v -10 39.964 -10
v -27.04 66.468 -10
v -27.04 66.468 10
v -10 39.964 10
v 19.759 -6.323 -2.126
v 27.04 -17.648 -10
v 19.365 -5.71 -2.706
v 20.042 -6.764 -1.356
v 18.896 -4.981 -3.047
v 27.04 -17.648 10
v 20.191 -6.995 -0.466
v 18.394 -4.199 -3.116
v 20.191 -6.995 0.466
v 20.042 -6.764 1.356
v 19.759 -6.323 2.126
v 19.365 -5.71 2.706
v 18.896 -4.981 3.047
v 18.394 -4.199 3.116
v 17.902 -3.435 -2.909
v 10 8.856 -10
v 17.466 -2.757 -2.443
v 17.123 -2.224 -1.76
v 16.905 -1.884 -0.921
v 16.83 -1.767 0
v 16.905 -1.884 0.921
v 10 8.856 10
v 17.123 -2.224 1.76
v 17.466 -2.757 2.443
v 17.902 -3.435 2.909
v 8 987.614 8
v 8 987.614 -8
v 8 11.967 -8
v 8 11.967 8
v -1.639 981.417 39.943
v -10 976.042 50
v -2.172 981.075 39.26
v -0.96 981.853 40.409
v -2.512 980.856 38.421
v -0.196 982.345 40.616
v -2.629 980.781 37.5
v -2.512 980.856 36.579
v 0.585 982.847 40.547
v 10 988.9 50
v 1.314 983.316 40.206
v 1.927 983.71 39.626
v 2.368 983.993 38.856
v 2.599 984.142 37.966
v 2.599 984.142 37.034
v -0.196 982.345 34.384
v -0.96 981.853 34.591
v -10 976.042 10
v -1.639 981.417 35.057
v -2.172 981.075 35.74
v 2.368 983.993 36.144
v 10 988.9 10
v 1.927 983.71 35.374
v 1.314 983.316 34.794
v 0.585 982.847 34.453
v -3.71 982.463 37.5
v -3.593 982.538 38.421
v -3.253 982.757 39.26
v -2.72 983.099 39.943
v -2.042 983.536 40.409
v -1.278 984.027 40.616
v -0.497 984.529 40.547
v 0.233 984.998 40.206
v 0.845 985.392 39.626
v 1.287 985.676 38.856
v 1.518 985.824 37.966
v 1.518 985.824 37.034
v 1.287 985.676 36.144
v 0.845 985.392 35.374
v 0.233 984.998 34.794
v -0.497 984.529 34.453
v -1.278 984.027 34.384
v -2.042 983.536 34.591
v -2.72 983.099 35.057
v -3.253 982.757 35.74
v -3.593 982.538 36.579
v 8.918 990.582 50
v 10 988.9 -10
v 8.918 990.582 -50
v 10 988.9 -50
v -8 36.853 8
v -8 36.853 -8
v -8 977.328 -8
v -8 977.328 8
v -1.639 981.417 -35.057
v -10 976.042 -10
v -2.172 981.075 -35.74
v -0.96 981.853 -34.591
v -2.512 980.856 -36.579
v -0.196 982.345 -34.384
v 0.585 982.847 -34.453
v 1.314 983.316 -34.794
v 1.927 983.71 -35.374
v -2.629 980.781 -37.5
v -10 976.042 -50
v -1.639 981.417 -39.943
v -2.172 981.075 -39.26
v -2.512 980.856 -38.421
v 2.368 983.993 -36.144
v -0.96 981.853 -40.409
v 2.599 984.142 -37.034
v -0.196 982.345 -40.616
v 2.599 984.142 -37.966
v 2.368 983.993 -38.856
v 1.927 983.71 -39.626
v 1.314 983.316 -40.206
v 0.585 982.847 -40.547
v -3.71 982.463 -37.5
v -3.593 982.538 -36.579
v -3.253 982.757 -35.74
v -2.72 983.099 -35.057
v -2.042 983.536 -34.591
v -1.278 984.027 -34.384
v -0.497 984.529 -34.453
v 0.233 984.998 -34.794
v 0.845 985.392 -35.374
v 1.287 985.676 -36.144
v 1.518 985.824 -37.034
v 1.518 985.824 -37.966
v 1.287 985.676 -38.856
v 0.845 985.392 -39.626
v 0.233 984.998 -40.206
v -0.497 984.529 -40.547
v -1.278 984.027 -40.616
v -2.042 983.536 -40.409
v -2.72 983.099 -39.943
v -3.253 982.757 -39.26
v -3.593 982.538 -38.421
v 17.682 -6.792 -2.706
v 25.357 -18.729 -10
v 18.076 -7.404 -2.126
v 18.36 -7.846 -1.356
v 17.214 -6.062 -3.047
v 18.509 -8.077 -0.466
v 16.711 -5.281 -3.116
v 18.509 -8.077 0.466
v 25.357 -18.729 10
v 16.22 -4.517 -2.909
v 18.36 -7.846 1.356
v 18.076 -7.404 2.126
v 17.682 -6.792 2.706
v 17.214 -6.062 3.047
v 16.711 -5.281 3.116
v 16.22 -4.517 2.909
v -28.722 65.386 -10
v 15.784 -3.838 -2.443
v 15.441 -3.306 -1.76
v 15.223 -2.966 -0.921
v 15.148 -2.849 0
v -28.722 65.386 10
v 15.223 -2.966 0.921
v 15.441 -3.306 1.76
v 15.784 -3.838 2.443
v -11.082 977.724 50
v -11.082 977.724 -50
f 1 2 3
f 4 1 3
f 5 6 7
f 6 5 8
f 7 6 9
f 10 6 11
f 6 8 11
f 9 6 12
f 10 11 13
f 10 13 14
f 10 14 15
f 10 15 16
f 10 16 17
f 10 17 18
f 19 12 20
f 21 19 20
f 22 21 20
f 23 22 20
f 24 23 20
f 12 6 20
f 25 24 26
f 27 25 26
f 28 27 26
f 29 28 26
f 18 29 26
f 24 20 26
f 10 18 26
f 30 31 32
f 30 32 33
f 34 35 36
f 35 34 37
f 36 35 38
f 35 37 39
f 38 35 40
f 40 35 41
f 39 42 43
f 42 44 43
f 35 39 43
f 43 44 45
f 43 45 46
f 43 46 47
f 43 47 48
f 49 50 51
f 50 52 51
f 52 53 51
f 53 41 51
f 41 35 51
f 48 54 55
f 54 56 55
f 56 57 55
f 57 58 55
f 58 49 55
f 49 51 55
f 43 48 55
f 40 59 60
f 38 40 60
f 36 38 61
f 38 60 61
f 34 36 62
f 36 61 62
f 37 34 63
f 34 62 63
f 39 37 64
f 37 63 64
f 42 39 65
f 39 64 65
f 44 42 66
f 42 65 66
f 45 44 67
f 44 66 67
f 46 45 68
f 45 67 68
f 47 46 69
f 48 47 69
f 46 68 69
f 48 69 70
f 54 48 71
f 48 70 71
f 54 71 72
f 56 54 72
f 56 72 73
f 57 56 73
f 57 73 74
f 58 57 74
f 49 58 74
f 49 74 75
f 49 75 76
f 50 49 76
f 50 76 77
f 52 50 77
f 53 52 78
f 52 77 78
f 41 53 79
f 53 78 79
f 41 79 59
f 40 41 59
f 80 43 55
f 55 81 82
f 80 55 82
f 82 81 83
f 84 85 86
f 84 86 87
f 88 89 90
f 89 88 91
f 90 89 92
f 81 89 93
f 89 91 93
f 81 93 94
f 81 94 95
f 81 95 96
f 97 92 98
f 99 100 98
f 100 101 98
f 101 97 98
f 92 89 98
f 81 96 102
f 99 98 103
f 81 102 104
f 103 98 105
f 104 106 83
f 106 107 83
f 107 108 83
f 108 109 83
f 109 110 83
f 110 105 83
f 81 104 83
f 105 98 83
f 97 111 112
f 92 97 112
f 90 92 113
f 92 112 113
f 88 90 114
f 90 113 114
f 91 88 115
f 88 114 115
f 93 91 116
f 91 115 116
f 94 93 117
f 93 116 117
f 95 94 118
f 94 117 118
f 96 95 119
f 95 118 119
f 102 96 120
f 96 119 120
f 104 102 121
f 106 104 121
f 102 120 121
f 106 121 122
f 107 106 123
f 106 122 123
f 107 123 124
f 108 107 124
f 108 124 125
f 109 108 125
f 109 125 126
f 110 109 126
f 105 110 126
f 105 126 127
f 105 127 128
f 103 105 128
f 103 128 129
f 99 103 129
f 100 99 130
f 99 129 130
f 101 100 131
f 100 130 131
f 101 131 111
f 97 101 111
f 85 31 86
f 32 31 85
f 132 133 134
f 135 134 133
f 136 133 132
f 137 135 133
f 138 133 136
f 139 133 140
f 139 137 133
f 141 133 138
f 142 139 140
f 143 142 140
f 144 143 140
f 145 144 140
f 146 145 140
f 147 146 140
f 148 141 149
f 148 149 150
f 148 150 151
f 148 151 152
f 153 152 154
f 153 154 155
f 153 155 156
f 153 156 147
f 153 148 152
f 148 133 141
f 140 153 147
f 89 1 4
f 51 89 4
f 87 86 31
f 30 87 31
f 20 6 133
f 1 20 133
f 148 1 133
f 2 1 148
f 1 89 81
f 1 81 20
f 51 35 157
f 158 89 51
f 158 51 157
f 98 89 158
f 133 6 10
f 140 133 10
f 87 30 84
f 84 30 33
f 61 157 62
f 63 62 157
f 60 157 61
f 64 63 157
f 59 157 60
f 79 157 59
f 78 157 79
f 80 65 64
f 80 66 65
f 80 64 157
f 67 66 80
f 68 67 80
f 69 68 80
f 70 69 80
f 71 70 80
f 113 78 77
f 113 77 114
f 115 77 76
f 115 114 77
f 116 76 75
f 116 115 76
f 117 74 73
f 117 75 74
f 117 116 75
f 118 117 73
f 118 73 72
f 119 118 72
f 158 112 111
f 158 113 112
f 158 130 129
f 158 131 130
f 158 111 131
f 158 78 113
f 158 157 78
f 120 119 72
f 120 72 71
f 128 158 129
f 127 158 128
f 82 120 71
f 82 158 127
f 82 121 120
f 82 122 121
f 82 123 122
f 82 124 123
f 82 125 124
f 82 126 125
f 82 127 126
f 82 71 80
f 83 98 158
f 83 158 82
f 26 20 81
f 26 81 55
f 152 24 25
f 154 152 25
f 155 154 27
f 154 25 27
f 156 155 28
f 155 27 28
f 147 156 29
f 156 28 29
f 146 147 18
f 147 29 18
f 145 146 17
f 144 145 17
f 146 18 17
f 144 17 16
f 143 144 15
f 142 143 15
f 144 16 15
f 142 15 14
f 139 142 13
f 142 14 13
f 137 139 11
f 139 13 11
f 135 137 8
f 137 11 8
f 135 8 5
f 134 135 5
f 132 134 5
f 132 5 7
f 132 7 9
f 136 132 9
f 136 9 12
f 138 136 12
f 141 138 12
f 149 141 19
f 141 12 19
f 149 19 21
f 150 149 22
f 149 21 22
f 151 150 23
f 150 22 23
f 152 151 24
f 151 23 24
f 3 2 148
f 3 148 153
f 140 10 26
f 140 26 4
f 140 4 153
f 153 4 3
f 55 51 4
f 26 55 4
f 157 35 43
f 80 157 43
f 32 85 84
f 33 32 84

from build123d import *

# Parameters (mm, degrees)
SKETCH15_W                                    = 20
SKETCH15_H                                    = 20
SKETCH15_W_2                                  = 16
SKETCH15_H_2                                  = 16
AL_TUBE_SQUARE_AL_TUBE_0_75_SQR_X_0_065_DEPTH = 988.9
SKETCH16_R                                    = 5
CUT_EXTRUDE1_DEPTH                            = 990.152773842
CUT_EXTRUDE3_DEPTH                            = 990.152773842
CUT_EXTRUDE4_DEPTH                            = 990.152773842
CUT_EXTRUDE4_DEPTH_BACK                       = 990.152773842
SKETCH19_W                                    = 20
SKETCH19_H                                    = 100
BOSS_EXTRUDE1_DEPTH                           = 2
SKETCH20_W                                    = 23.776793386
SKETCH20_H                                    = 100
BOSS_EXTRUDE2_DEPTH                           = 2
SKETCH22_R                                    = 3.125
CUT_EXTRUDE5_DEPTH                            = 2
SKETCH23_R                                    = 3.125
CUT_EXTRUDE6_DEPTH                            = 2


with BuildPart() as part:
    # Sketch15 → Al tube square AL TUBE 0.75 SQR X 0.065 WALL(1) (new body)
    with BuildSketch(Plane(origin=(0, 0, 0), x_dir=(-1, 0, 0), z_dir=(0, 1, 0))):
        Rectangle(SKETCH15_W, SKETCH15_H)
        Rectangle(SKETCH15_W_2, SKETCH15_H_2, mode=Mode.SUBTRACT)
    extrude(amount=AL_TUBE_SQUARE_AL_TUBE_0_75_SQR_X_0_065_DEPTH)

    # Sketch16 → Cut-Extrude1 (cut, through all)
    with BuildSketch(Plane.XY.offset(10)):
        with Locations((0, 10)):
            Circle(SKETCH16_R)
    extrude(amount=-CUT_EXTRUDE1_DEPTH, mode=Mode.SUBTRACT)

    # Sketch17 → Cut-Extrude3 (cut, through all)
    with BuildSketch(Plane.XY.offset(10)):
        Polygon((10, 988.9), (-10, 976.041699033), (-10, 988.9), align=None)
    extrude(amount=-CUT_EXTRUDE3_DEPTH, mode=Mode.SUBTRACT)

    # Sketch18 → Cut-Extrude4 (cut, two sides: drawn at the far end of the back side and taken through both)
    with BuildSketch(Plane(origin=(0, 0, -10), x_dir=(-1, 0, 0), z_dir=(0, 0, -1)).offset(-CUT_EXTRUDE4_DEPTH_BACK)):
        Polygon((-15.481315588, 0.33029398), (41.362305483, 88.745740497), (41.362305483, -42.243020437), (-15.481315588, -42.243020437), align=None)
    extrude(amount=CUT_EXTRUDE4_DEPTH + CUT_EXTRUDE4_DEPTH_BACK, mode=Mode.SUBTRACT)

    # Sketch19 → Boss-Extrude1 (add)
    with BuildSketch(Plane(origin=(11.103958871, 7.138902254, 0), x_dir=(0, 0, 1), z_dir=(-0.8411563188826338, -0.5407920554185471, 0))):
        with Locations((0, 20.532769961)):
            Rectangle(SKETCH19_W, SKETCH19_H)
    extrude(amount=BOSS_EXTRUDE1_DEPTH)

    # Sketch20 → Boss-Extrude2 (add)
    with BuildSketch(Plane(origin=(-446.916807879, 695.141308374, 0), x_dir=(0.8411563188826335, 0.5407920554185475, 0), z_dir=(-0.5407920554185475, 0.8411563188826335, 0))):
        with Locations((531.312430099, 0)):
            Rectangle(SKETCH20_W, SKETCH20_H)
    extrude(amount=BOSS_EXTRUDE2_DEPTH)

    # Sketch22 → Cut-Extrude5 (cut)
    with BuildSketch(Plane(origin=(-447.998391989, 696.823621012, 0), x_dir=(0.8411563188826324, 0.5407920554185492, 0), z_dir=(-0.5407920554185492, 0.8411563188826324, 0))):
        with Locations(Location((531.312430099, 37.5, 0), (0, 0, 180))):
            Circle(SKETCH22_R)
        with Locations(Location((531.312430099, -37.5, 0), (0, 0, 180))):
            Circle(SKETCH22_R)
    extrude(amount=-CUT_EXTRUDE5_DEPTH, mode=Mode.SUBTRACT)

    # Sketch23 → Cut-Extrude6 (cut)
    with BuildSketch(Plane(origin=(11.103958871, 7.138902254, 0), x_dir=(0, 0, -1), z_dir=(0.8411563188826338, 0.540792055418547, 0))):
        with Locations(Location((0, -13.712927992, 0), (0, 0, 90))):
            Circle(SKETCH23_R)
    extrude(amount=-CUT_EXTRUDE6_DEPTH, mode=Mode.SUBTRACT)


solid = part.part
